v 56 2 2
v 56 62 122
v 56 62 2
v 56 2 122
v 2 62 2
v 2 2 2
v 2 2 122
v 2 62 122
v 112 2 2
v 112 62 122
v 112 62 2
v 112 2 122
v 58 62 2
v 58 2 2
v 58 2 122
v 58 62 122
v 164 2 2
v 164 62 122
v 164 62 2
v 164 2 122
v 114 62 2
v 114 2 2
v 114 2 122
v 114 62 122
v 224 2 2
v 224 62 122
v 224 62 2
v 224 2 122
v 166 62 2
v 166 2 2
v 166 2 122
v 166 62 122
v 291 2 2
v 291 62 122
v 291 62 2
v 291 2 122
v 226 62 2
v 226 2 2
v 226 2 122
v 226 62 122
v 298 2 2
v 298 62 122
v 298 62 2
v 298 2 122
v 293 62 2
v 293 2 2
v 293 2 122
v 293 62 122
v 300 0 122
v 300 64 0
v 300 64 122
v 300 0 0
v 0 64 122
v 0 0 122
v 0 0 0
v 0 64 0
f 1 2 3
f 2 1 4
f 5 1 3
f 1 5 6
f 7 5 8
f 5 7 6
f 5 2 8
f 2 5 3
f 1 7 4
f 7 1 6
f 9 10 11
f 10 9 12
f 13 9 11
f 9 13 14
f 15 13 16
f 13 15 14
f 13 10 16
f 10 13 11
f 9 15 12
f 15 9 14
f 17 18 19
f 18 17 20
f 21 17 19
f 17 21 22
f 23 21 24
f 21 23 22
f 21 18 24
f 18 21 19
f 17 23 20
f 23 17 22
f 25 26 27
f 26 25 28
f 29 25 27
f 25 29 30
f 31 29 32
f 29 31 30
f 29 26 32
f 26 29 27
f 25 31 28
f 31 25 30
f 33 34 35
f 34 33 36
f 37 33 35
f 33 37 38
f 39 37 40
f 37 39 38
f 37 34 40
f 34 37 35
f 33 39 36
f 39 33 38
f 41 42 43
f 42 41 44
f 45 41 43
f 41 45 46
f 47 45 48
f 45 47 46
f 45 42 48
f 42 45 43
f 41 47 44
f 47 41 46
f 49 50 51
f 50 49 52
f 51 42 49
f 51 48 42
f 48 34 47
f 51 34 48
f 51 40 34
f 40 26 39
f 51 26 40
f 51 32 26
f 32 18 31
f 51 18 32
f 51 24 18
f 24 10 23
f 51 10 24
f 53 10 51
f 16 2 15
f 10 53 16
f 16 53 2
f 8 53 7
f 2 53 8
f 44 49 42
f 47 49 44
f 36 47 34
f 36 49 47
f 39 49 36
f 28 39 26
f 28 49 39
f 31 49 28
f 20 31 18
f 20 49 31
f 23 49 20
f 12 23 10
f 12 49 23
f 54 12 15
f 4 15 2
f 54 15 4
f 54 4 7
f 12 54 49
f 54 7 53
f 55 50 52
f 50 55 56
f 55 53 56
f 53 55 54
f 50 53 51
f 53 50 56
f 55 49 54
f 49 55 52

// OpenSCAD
/* [Global] */
// Thickness of the walls (front, back, bottom, sides and gaps)
thickness = 2;
// Width of the box
width = 60;
// Height of the box
height = 120;
// Lengths of the holes
lengths = [0,54,54,50,0,58,0,65,0,5];

 // recursion - find the sum of the values in a vector (array) by calling itself
 // from the start (or s'th element) to the i'th element - remember elements are zero based
function sumv(v,i,s=0) = (i<0 ? 0 :(i==s ? v[i] : v[i] + sumv(v,i-1,s)));

// recursion - find the count of the values different of zero in a vector (array) from start (s) to the i'th element.
function lenWZ(v,i,s=0) =   (i<0 || s<0 || s>i) ? 0 : (((v[i]==0) ? 0 : 1) + ((i==s) ? 0 : lenWZ(v,i-1,s)));

difference()
{
    color("red")
    cube([sumv(lengths,len(lengths)-1)+(lenWZ(lengths,len(lengths)))*thickness,width+2*thickness,height+thickness]);
    
    for(i = [0 : len(lengths)-1])
        if (lengths[i]!=0)
            translate([sumv(lengths,i-1)+(lenWZ(lengths,i))*thickness,thickness,thickness])
            cube([lengths[i],width,height+1]);
}
